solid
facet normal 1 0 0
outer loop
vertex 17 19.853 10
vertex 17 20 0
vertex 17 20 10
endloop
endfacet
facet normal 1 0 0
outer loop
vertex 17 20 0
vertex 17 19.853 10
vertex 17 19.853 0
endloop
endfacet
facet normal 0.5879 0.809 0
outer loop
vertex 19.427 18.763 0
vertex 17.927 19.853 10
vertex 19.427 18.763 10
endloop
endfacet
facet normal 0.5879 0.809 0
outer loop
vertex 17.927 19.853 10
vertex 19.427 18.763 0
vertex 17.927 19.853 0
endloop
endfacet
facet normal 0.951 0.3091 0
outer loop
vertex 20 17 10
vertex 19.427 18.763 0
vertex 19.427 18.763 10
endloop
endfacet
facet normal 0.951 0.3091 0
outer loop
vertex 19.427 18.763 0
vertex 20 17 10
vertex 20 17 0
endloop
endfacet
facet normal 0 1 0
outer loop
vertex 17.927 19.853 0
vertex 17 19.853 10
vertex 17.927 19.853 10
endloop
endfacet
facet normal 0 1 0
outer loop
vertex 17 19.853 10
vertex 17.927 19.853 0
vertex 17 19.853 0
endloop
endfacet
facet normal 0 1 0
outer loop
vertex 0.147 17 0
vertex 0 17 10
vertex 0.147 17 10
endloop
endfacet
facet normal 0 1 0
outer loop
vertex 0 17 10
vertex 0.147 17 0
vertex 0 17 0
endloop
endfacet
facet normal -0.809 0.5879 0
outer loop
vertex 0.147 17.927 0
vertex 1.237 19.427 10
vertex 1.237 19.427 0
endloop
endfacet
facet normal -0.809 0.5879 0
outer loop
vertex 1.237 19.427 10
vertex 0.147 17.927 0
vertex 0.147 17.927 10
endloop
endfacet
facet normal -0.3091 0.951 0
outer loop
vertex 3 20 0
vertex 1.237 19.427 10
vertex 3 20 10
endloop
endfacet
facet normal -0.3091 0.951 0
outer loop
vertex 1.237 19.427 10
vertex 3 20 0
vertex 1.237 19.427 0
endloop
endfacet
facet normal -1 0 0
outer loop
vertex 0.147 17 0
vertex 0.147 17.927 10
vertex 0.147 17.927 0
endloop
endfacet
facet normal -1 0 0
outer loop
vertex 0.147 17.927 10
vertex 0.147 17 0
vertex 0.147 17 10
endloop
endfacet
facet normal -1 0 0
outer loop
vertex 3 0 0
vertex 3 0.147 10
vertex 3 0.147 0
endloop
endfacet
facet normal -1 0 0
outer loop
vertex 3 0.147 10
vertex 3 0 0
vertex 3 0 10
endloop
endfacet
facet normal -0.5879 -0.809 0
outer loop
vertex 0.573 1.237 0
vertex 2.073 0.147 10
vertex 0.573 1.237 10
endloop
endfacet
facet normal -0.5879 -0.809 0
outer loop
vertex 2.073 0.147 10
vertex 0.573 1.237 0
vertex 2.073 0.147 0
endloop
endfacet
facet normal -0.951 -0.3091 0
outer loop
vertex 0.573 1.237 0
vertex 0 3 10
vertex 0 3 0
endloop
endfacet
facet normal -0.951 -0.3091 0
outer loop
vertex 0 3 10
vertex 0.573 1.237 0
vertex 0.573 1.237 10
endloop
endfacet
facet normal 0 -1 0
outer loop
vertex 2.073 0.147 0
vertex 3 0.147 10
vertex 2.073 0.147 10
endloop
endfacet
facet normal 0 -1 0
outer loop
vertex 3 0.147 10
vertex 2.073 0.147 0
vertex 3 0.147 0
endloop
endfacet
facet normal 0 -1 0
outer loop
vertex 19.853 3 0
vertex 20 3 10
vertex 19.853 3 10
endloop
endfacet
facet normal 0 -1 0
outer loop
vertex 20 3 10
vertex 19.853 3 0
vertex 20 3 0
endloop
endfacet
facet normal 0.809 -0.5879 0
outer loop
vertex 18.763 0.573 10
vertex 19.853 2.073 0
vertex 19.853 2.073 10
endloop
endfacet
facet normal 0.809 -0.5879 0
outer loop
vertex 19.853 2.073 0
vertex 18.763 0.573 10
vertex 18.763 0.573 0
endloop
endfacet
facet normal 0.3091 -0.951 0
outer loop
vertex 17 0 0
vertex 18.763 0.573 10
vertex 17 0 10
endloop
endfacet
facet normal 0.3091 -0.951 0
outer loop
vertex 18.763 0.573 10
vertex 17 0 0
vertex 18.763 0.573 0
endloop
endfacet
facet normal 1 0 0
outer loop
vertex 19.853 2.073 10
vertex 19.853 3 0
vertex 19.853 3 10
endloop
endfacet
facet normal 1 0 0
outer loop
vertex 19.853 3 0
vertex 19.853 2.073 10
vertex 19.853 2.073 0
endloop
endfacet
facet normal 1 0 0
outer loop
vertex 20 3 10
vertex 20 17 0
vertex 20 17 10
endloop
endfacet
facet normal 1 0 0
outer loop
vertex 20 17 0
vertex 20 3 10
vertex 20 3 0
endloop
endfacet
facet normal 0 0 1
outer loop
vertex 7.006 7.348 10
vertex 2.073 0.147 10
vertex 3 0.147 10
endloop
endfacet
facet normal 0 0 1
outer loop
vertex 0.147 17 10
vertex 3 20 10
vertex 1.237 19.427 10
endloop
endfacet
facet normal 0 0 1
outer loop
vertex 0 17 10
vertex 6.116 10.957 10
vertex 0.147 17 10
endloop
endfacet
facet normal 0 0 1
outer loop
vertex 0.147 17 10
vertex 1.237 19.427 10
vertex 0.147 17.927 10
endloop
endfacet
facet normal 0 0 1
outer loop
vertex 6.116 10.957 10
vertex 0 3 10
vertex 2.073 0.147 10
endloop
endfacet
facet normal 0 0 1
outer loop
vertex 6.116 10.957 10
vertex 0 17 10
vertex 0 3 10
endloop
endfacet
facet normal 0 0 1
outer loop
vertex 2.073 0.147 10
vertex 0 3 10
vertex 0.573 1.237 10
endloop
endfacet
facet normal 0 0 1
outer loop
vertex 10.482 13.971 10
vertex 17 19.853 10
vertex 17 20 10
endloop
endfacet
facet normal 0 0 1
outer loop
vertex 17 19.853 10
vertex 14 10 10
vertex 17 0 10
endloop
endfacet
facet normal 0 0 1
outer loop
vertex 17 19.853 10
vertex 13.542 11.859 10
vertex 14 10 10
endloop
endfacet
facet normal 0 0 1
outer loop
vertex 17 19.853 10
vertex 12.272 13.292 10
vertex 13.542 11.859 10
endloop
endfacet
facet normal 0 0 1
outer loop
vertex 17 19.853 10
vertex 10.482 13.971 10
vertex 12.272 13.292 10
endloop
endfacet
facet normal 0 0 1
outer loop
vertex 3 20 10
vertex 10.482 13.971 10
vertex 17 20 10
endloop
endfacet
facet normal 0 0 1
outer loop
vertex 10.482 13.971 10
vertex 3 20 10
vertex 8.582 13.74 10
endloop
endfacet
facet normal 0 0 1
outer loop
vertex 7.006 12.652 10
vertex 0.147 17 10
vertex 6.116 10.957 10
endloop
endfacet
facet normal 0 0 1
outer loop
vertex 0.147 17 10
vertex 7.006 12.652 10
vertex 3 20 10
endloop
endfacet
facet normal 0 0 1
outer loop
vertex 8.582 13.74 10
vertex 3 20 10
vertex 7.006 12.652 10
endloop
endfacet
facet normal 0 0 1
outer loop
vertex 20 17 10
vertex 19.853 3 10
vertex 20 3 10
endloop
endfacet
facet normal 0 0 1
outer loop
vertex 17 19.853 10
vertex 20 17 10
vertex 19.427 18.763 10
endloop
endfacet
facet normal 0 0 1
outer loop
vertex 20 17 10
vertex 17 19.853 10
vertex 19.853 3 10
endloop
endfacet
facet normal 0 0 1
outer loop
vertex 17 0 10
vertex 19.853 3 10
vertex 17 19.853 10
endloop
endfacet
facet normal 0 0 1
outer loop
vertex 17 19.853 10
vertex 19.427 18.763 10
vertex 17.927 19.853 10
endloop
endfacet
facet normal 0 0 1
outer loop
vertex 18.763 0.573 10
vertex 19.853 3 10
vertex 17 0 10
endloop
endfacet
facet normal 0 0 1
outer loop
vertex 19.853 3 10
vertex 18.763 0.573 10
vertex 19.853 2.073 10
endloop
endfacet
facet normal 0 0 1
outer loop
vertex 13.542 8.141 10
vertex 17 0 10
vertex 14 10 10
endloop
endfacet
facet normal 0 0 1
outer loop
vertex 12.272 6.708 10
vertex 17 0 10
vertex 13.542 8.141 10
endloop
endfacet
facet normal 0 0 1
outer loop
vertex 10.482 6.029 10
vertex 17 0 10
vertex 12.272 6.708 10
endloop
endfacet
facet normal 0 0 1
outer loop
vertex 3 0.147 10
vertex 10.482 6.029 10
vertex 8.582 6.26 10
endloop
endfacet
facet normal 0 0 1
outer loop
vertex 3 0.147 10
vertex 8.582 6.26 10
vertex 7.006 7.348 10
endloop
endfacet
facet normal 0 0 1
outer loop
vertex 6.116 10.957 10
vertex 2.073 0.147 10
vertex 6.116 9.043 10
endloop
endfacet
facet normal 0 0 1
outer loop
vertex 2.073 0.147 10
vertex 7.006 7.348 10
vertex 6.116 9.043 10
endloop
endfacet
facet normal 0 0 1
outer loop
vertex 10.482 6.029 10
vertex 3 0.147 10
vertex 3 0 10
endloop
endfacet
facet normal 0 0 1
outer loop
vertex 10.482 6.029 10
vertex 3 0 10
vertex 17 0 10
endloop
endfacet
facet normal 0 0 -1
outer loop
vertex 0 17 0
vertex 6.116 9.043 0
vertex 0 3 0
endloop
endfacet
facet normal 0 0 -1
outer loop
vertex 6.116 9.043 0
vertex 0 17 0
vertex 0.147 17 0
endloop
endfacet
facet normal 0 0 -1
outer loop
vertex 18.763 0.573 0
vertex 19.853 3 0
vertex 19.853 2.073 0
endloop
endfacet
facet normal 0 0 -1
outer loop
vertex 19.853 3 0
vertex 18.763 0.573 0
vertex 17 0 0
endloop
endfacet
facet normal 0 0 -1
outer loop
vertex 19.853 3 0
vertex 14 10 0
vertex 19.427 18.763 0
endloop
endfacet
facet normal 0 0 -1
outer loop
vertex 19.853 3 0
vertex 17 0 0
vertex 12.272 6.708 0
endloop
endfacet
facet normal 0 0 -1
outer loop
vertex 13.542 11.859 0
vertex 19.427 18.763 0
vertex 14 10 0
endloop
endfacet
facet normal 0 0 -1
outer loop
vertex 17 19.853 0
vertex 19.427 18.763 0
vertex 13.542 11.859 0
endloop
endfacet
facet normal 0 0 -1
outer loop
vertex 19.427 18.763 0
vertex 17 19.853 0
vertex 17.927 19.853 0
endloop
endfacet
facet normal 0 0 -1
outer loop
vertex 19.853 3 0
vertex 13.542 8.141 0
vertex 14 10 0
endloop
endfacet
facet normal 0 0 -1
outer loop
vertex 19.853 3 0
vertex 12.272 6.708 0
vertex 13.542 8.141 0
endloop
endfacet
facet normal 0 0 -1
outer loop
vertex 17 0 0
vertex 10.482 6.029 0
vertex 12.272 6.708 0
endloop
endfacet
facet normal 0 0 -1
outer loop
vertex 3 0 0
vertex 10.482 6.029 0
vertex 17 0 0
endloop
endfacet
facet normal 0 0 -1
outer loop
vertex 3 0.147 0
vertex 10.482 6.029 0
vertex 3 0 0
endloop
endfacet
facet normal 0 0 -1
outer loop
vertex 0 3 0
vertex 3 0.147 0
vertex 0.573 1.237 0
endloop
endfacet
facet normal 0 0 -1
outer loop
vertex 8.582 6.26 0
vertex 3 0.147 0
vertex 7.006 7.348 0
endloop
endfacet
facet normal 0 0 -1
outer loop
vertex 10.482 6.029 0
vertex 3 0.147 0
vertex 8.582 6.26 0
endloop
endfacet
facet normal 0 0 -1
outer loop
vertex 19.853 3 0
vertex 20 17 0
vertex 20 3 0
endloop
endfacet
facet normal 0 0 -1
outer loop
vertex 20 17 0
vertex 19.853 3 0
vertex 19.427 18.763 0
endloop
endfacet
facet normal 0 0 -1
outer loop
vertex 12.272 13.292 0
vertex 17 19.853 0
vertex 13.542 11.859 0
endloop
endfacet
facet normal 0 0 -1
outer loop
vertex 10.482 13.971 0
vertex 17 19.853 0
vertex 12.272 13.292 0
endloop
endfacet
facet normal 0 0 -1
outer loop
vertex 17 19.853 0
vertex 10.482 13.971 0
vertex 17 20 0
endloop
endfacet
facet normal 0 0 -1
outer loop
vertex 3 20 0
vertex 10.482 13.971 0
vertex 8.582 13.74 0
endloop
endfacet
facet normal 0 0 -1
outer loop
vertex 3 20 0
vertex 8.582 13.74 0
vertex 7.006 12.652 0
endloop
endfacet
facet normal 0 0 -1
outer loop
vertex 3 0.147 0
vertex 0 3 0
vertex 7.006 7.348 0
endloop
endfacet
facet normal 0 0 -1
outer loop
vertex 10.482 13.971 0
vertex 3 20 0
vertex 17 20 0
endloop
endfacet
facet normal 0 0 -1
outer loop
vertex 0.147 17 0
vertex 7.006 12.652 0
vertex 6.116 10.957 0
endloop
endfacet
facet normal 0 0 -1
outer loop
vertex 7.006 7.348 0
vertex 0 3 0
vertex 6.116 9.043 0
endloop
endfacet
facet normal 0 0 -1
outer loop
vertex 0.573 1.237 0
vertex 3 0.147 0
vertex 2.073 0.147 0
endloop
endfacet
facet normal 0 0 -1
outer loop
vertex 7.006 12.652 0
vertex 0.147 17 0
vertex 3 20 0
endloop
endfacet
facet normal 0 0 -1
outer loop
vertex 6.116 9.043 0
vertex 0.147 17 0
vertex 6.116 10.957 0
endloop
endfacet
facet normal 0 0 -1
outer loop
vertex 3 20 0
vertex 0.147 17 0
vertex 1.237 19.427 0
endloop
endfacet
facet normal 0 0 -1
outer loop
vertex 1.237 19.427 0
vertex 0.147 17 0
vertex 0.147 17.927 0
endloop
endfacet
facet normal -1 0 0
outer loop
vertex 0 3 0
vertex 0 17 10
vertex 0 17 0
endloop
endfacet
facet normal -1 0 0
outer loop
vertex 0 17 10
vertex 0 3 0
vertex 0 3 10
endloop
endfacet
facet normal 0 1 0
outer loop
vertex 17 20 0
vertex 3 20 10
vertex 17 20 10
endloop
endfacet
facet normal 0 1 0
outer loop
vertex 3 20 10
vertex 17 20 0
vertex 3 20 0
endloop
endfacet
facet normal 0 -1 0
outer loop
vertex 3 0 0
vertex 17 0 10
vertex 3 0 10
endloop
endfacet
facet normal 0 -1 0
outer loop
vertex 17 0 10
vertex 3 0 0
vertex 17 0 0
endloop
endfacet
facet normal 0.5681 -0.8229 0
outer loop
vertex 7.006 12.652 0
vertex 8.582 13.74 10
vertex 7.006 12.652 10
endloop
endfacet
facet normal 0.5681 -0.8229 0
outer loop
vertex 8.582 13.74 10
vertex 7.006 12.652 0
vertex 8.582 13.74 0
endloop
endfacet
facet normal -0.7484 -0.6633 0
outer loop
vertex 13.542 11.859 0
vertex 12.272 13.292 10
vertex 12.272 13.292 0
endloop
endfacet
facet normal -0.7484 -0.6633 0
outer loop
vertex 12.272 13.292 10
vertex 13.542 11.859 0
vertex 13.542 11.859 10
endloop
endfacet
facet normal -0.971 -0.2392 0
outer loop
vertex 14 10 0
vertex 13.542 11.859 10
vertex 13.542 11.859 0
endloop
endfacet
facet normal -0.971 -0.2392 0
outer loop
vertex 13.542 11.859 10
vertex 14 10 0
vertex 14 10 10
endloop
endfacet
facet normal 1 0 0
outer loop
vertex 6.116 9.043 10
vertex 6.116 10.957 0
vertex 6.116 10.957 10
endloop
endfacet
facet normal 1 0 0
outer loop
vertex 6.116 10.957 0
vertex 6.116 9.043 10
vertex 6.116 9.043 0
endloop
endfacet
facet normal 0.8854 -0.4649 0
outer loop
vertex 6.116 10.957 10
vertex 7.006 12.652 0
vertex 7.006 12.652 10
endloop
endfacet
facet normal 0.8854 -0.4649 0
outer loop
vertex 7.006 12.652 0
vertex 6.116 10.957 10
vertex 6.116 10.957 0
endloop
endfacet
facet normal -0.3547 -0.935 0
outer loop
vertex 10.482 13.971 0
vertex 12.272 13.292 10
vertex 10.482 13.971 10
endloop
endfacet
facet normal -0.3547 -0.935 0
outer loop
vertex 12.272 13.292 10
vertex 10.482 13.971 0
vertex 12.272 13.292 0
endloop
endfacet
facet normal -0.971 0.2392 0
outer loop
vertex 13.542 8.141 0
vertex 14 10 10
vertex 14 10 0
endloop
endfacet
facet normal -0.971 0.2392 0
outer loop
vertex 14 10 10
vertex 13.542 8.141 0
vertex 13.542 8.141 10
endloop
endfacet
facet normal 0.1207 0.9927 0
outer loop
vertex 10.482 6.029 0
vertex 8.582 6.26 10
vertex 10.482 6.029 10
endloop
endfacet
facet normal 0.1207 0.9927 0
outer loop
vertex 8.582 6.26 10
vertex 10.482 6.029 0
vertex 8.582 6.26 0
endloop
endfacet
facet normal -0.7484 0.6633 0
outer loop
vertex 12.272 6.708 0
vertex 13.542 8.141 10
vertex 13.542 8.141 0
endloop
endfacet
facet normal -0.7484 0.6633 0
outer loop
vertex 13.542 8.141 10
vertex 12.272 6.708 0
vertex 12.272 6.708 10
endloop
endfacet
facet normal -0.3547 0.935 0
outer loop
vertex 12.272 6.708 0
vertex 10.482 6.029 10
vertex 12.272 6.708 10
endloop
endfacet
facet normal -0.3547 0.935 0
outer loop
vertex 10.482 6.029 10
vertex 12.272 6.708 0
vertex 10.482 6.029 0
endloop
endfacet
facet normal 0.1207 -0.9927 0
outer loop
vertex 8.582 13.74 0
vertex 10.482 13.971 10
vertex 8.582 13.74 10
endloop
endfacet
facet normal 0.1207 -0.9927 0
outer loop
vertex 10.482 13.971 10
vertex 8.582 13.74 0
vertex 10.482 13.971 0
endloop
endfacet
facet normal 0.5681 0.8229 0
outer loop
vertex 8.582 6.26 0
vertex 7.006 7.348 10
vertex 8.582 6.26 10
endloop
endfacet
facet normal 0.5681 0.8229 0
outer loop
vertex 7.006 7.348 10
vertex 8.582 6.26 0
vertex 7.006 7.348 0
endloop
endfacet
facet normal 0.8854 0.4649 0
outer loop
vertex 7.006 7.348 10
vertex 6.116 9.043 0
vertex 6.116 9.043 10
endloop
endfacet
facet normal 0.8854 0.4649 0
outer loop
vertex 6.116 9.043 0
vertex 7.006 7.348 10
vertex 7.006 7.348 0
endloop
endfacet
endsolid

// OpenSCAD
// The exact-geometry audit's case f02 (docs/audits/exact-geometry-rust.md).
// volume: 3420.0885142487145
difference() {
  cube([20,20,10]);
  for (c = [[17,17,0],[3,17,90],[3,3,180],[17,3,270]])
    translate([c[0],c[1],-1]) rotate(c[2]) difference() { cube([4,4,12]); cylinder(r=3, h=12); }
  translate([10,10,-1]) cylinder(r=4, h=12);
}
